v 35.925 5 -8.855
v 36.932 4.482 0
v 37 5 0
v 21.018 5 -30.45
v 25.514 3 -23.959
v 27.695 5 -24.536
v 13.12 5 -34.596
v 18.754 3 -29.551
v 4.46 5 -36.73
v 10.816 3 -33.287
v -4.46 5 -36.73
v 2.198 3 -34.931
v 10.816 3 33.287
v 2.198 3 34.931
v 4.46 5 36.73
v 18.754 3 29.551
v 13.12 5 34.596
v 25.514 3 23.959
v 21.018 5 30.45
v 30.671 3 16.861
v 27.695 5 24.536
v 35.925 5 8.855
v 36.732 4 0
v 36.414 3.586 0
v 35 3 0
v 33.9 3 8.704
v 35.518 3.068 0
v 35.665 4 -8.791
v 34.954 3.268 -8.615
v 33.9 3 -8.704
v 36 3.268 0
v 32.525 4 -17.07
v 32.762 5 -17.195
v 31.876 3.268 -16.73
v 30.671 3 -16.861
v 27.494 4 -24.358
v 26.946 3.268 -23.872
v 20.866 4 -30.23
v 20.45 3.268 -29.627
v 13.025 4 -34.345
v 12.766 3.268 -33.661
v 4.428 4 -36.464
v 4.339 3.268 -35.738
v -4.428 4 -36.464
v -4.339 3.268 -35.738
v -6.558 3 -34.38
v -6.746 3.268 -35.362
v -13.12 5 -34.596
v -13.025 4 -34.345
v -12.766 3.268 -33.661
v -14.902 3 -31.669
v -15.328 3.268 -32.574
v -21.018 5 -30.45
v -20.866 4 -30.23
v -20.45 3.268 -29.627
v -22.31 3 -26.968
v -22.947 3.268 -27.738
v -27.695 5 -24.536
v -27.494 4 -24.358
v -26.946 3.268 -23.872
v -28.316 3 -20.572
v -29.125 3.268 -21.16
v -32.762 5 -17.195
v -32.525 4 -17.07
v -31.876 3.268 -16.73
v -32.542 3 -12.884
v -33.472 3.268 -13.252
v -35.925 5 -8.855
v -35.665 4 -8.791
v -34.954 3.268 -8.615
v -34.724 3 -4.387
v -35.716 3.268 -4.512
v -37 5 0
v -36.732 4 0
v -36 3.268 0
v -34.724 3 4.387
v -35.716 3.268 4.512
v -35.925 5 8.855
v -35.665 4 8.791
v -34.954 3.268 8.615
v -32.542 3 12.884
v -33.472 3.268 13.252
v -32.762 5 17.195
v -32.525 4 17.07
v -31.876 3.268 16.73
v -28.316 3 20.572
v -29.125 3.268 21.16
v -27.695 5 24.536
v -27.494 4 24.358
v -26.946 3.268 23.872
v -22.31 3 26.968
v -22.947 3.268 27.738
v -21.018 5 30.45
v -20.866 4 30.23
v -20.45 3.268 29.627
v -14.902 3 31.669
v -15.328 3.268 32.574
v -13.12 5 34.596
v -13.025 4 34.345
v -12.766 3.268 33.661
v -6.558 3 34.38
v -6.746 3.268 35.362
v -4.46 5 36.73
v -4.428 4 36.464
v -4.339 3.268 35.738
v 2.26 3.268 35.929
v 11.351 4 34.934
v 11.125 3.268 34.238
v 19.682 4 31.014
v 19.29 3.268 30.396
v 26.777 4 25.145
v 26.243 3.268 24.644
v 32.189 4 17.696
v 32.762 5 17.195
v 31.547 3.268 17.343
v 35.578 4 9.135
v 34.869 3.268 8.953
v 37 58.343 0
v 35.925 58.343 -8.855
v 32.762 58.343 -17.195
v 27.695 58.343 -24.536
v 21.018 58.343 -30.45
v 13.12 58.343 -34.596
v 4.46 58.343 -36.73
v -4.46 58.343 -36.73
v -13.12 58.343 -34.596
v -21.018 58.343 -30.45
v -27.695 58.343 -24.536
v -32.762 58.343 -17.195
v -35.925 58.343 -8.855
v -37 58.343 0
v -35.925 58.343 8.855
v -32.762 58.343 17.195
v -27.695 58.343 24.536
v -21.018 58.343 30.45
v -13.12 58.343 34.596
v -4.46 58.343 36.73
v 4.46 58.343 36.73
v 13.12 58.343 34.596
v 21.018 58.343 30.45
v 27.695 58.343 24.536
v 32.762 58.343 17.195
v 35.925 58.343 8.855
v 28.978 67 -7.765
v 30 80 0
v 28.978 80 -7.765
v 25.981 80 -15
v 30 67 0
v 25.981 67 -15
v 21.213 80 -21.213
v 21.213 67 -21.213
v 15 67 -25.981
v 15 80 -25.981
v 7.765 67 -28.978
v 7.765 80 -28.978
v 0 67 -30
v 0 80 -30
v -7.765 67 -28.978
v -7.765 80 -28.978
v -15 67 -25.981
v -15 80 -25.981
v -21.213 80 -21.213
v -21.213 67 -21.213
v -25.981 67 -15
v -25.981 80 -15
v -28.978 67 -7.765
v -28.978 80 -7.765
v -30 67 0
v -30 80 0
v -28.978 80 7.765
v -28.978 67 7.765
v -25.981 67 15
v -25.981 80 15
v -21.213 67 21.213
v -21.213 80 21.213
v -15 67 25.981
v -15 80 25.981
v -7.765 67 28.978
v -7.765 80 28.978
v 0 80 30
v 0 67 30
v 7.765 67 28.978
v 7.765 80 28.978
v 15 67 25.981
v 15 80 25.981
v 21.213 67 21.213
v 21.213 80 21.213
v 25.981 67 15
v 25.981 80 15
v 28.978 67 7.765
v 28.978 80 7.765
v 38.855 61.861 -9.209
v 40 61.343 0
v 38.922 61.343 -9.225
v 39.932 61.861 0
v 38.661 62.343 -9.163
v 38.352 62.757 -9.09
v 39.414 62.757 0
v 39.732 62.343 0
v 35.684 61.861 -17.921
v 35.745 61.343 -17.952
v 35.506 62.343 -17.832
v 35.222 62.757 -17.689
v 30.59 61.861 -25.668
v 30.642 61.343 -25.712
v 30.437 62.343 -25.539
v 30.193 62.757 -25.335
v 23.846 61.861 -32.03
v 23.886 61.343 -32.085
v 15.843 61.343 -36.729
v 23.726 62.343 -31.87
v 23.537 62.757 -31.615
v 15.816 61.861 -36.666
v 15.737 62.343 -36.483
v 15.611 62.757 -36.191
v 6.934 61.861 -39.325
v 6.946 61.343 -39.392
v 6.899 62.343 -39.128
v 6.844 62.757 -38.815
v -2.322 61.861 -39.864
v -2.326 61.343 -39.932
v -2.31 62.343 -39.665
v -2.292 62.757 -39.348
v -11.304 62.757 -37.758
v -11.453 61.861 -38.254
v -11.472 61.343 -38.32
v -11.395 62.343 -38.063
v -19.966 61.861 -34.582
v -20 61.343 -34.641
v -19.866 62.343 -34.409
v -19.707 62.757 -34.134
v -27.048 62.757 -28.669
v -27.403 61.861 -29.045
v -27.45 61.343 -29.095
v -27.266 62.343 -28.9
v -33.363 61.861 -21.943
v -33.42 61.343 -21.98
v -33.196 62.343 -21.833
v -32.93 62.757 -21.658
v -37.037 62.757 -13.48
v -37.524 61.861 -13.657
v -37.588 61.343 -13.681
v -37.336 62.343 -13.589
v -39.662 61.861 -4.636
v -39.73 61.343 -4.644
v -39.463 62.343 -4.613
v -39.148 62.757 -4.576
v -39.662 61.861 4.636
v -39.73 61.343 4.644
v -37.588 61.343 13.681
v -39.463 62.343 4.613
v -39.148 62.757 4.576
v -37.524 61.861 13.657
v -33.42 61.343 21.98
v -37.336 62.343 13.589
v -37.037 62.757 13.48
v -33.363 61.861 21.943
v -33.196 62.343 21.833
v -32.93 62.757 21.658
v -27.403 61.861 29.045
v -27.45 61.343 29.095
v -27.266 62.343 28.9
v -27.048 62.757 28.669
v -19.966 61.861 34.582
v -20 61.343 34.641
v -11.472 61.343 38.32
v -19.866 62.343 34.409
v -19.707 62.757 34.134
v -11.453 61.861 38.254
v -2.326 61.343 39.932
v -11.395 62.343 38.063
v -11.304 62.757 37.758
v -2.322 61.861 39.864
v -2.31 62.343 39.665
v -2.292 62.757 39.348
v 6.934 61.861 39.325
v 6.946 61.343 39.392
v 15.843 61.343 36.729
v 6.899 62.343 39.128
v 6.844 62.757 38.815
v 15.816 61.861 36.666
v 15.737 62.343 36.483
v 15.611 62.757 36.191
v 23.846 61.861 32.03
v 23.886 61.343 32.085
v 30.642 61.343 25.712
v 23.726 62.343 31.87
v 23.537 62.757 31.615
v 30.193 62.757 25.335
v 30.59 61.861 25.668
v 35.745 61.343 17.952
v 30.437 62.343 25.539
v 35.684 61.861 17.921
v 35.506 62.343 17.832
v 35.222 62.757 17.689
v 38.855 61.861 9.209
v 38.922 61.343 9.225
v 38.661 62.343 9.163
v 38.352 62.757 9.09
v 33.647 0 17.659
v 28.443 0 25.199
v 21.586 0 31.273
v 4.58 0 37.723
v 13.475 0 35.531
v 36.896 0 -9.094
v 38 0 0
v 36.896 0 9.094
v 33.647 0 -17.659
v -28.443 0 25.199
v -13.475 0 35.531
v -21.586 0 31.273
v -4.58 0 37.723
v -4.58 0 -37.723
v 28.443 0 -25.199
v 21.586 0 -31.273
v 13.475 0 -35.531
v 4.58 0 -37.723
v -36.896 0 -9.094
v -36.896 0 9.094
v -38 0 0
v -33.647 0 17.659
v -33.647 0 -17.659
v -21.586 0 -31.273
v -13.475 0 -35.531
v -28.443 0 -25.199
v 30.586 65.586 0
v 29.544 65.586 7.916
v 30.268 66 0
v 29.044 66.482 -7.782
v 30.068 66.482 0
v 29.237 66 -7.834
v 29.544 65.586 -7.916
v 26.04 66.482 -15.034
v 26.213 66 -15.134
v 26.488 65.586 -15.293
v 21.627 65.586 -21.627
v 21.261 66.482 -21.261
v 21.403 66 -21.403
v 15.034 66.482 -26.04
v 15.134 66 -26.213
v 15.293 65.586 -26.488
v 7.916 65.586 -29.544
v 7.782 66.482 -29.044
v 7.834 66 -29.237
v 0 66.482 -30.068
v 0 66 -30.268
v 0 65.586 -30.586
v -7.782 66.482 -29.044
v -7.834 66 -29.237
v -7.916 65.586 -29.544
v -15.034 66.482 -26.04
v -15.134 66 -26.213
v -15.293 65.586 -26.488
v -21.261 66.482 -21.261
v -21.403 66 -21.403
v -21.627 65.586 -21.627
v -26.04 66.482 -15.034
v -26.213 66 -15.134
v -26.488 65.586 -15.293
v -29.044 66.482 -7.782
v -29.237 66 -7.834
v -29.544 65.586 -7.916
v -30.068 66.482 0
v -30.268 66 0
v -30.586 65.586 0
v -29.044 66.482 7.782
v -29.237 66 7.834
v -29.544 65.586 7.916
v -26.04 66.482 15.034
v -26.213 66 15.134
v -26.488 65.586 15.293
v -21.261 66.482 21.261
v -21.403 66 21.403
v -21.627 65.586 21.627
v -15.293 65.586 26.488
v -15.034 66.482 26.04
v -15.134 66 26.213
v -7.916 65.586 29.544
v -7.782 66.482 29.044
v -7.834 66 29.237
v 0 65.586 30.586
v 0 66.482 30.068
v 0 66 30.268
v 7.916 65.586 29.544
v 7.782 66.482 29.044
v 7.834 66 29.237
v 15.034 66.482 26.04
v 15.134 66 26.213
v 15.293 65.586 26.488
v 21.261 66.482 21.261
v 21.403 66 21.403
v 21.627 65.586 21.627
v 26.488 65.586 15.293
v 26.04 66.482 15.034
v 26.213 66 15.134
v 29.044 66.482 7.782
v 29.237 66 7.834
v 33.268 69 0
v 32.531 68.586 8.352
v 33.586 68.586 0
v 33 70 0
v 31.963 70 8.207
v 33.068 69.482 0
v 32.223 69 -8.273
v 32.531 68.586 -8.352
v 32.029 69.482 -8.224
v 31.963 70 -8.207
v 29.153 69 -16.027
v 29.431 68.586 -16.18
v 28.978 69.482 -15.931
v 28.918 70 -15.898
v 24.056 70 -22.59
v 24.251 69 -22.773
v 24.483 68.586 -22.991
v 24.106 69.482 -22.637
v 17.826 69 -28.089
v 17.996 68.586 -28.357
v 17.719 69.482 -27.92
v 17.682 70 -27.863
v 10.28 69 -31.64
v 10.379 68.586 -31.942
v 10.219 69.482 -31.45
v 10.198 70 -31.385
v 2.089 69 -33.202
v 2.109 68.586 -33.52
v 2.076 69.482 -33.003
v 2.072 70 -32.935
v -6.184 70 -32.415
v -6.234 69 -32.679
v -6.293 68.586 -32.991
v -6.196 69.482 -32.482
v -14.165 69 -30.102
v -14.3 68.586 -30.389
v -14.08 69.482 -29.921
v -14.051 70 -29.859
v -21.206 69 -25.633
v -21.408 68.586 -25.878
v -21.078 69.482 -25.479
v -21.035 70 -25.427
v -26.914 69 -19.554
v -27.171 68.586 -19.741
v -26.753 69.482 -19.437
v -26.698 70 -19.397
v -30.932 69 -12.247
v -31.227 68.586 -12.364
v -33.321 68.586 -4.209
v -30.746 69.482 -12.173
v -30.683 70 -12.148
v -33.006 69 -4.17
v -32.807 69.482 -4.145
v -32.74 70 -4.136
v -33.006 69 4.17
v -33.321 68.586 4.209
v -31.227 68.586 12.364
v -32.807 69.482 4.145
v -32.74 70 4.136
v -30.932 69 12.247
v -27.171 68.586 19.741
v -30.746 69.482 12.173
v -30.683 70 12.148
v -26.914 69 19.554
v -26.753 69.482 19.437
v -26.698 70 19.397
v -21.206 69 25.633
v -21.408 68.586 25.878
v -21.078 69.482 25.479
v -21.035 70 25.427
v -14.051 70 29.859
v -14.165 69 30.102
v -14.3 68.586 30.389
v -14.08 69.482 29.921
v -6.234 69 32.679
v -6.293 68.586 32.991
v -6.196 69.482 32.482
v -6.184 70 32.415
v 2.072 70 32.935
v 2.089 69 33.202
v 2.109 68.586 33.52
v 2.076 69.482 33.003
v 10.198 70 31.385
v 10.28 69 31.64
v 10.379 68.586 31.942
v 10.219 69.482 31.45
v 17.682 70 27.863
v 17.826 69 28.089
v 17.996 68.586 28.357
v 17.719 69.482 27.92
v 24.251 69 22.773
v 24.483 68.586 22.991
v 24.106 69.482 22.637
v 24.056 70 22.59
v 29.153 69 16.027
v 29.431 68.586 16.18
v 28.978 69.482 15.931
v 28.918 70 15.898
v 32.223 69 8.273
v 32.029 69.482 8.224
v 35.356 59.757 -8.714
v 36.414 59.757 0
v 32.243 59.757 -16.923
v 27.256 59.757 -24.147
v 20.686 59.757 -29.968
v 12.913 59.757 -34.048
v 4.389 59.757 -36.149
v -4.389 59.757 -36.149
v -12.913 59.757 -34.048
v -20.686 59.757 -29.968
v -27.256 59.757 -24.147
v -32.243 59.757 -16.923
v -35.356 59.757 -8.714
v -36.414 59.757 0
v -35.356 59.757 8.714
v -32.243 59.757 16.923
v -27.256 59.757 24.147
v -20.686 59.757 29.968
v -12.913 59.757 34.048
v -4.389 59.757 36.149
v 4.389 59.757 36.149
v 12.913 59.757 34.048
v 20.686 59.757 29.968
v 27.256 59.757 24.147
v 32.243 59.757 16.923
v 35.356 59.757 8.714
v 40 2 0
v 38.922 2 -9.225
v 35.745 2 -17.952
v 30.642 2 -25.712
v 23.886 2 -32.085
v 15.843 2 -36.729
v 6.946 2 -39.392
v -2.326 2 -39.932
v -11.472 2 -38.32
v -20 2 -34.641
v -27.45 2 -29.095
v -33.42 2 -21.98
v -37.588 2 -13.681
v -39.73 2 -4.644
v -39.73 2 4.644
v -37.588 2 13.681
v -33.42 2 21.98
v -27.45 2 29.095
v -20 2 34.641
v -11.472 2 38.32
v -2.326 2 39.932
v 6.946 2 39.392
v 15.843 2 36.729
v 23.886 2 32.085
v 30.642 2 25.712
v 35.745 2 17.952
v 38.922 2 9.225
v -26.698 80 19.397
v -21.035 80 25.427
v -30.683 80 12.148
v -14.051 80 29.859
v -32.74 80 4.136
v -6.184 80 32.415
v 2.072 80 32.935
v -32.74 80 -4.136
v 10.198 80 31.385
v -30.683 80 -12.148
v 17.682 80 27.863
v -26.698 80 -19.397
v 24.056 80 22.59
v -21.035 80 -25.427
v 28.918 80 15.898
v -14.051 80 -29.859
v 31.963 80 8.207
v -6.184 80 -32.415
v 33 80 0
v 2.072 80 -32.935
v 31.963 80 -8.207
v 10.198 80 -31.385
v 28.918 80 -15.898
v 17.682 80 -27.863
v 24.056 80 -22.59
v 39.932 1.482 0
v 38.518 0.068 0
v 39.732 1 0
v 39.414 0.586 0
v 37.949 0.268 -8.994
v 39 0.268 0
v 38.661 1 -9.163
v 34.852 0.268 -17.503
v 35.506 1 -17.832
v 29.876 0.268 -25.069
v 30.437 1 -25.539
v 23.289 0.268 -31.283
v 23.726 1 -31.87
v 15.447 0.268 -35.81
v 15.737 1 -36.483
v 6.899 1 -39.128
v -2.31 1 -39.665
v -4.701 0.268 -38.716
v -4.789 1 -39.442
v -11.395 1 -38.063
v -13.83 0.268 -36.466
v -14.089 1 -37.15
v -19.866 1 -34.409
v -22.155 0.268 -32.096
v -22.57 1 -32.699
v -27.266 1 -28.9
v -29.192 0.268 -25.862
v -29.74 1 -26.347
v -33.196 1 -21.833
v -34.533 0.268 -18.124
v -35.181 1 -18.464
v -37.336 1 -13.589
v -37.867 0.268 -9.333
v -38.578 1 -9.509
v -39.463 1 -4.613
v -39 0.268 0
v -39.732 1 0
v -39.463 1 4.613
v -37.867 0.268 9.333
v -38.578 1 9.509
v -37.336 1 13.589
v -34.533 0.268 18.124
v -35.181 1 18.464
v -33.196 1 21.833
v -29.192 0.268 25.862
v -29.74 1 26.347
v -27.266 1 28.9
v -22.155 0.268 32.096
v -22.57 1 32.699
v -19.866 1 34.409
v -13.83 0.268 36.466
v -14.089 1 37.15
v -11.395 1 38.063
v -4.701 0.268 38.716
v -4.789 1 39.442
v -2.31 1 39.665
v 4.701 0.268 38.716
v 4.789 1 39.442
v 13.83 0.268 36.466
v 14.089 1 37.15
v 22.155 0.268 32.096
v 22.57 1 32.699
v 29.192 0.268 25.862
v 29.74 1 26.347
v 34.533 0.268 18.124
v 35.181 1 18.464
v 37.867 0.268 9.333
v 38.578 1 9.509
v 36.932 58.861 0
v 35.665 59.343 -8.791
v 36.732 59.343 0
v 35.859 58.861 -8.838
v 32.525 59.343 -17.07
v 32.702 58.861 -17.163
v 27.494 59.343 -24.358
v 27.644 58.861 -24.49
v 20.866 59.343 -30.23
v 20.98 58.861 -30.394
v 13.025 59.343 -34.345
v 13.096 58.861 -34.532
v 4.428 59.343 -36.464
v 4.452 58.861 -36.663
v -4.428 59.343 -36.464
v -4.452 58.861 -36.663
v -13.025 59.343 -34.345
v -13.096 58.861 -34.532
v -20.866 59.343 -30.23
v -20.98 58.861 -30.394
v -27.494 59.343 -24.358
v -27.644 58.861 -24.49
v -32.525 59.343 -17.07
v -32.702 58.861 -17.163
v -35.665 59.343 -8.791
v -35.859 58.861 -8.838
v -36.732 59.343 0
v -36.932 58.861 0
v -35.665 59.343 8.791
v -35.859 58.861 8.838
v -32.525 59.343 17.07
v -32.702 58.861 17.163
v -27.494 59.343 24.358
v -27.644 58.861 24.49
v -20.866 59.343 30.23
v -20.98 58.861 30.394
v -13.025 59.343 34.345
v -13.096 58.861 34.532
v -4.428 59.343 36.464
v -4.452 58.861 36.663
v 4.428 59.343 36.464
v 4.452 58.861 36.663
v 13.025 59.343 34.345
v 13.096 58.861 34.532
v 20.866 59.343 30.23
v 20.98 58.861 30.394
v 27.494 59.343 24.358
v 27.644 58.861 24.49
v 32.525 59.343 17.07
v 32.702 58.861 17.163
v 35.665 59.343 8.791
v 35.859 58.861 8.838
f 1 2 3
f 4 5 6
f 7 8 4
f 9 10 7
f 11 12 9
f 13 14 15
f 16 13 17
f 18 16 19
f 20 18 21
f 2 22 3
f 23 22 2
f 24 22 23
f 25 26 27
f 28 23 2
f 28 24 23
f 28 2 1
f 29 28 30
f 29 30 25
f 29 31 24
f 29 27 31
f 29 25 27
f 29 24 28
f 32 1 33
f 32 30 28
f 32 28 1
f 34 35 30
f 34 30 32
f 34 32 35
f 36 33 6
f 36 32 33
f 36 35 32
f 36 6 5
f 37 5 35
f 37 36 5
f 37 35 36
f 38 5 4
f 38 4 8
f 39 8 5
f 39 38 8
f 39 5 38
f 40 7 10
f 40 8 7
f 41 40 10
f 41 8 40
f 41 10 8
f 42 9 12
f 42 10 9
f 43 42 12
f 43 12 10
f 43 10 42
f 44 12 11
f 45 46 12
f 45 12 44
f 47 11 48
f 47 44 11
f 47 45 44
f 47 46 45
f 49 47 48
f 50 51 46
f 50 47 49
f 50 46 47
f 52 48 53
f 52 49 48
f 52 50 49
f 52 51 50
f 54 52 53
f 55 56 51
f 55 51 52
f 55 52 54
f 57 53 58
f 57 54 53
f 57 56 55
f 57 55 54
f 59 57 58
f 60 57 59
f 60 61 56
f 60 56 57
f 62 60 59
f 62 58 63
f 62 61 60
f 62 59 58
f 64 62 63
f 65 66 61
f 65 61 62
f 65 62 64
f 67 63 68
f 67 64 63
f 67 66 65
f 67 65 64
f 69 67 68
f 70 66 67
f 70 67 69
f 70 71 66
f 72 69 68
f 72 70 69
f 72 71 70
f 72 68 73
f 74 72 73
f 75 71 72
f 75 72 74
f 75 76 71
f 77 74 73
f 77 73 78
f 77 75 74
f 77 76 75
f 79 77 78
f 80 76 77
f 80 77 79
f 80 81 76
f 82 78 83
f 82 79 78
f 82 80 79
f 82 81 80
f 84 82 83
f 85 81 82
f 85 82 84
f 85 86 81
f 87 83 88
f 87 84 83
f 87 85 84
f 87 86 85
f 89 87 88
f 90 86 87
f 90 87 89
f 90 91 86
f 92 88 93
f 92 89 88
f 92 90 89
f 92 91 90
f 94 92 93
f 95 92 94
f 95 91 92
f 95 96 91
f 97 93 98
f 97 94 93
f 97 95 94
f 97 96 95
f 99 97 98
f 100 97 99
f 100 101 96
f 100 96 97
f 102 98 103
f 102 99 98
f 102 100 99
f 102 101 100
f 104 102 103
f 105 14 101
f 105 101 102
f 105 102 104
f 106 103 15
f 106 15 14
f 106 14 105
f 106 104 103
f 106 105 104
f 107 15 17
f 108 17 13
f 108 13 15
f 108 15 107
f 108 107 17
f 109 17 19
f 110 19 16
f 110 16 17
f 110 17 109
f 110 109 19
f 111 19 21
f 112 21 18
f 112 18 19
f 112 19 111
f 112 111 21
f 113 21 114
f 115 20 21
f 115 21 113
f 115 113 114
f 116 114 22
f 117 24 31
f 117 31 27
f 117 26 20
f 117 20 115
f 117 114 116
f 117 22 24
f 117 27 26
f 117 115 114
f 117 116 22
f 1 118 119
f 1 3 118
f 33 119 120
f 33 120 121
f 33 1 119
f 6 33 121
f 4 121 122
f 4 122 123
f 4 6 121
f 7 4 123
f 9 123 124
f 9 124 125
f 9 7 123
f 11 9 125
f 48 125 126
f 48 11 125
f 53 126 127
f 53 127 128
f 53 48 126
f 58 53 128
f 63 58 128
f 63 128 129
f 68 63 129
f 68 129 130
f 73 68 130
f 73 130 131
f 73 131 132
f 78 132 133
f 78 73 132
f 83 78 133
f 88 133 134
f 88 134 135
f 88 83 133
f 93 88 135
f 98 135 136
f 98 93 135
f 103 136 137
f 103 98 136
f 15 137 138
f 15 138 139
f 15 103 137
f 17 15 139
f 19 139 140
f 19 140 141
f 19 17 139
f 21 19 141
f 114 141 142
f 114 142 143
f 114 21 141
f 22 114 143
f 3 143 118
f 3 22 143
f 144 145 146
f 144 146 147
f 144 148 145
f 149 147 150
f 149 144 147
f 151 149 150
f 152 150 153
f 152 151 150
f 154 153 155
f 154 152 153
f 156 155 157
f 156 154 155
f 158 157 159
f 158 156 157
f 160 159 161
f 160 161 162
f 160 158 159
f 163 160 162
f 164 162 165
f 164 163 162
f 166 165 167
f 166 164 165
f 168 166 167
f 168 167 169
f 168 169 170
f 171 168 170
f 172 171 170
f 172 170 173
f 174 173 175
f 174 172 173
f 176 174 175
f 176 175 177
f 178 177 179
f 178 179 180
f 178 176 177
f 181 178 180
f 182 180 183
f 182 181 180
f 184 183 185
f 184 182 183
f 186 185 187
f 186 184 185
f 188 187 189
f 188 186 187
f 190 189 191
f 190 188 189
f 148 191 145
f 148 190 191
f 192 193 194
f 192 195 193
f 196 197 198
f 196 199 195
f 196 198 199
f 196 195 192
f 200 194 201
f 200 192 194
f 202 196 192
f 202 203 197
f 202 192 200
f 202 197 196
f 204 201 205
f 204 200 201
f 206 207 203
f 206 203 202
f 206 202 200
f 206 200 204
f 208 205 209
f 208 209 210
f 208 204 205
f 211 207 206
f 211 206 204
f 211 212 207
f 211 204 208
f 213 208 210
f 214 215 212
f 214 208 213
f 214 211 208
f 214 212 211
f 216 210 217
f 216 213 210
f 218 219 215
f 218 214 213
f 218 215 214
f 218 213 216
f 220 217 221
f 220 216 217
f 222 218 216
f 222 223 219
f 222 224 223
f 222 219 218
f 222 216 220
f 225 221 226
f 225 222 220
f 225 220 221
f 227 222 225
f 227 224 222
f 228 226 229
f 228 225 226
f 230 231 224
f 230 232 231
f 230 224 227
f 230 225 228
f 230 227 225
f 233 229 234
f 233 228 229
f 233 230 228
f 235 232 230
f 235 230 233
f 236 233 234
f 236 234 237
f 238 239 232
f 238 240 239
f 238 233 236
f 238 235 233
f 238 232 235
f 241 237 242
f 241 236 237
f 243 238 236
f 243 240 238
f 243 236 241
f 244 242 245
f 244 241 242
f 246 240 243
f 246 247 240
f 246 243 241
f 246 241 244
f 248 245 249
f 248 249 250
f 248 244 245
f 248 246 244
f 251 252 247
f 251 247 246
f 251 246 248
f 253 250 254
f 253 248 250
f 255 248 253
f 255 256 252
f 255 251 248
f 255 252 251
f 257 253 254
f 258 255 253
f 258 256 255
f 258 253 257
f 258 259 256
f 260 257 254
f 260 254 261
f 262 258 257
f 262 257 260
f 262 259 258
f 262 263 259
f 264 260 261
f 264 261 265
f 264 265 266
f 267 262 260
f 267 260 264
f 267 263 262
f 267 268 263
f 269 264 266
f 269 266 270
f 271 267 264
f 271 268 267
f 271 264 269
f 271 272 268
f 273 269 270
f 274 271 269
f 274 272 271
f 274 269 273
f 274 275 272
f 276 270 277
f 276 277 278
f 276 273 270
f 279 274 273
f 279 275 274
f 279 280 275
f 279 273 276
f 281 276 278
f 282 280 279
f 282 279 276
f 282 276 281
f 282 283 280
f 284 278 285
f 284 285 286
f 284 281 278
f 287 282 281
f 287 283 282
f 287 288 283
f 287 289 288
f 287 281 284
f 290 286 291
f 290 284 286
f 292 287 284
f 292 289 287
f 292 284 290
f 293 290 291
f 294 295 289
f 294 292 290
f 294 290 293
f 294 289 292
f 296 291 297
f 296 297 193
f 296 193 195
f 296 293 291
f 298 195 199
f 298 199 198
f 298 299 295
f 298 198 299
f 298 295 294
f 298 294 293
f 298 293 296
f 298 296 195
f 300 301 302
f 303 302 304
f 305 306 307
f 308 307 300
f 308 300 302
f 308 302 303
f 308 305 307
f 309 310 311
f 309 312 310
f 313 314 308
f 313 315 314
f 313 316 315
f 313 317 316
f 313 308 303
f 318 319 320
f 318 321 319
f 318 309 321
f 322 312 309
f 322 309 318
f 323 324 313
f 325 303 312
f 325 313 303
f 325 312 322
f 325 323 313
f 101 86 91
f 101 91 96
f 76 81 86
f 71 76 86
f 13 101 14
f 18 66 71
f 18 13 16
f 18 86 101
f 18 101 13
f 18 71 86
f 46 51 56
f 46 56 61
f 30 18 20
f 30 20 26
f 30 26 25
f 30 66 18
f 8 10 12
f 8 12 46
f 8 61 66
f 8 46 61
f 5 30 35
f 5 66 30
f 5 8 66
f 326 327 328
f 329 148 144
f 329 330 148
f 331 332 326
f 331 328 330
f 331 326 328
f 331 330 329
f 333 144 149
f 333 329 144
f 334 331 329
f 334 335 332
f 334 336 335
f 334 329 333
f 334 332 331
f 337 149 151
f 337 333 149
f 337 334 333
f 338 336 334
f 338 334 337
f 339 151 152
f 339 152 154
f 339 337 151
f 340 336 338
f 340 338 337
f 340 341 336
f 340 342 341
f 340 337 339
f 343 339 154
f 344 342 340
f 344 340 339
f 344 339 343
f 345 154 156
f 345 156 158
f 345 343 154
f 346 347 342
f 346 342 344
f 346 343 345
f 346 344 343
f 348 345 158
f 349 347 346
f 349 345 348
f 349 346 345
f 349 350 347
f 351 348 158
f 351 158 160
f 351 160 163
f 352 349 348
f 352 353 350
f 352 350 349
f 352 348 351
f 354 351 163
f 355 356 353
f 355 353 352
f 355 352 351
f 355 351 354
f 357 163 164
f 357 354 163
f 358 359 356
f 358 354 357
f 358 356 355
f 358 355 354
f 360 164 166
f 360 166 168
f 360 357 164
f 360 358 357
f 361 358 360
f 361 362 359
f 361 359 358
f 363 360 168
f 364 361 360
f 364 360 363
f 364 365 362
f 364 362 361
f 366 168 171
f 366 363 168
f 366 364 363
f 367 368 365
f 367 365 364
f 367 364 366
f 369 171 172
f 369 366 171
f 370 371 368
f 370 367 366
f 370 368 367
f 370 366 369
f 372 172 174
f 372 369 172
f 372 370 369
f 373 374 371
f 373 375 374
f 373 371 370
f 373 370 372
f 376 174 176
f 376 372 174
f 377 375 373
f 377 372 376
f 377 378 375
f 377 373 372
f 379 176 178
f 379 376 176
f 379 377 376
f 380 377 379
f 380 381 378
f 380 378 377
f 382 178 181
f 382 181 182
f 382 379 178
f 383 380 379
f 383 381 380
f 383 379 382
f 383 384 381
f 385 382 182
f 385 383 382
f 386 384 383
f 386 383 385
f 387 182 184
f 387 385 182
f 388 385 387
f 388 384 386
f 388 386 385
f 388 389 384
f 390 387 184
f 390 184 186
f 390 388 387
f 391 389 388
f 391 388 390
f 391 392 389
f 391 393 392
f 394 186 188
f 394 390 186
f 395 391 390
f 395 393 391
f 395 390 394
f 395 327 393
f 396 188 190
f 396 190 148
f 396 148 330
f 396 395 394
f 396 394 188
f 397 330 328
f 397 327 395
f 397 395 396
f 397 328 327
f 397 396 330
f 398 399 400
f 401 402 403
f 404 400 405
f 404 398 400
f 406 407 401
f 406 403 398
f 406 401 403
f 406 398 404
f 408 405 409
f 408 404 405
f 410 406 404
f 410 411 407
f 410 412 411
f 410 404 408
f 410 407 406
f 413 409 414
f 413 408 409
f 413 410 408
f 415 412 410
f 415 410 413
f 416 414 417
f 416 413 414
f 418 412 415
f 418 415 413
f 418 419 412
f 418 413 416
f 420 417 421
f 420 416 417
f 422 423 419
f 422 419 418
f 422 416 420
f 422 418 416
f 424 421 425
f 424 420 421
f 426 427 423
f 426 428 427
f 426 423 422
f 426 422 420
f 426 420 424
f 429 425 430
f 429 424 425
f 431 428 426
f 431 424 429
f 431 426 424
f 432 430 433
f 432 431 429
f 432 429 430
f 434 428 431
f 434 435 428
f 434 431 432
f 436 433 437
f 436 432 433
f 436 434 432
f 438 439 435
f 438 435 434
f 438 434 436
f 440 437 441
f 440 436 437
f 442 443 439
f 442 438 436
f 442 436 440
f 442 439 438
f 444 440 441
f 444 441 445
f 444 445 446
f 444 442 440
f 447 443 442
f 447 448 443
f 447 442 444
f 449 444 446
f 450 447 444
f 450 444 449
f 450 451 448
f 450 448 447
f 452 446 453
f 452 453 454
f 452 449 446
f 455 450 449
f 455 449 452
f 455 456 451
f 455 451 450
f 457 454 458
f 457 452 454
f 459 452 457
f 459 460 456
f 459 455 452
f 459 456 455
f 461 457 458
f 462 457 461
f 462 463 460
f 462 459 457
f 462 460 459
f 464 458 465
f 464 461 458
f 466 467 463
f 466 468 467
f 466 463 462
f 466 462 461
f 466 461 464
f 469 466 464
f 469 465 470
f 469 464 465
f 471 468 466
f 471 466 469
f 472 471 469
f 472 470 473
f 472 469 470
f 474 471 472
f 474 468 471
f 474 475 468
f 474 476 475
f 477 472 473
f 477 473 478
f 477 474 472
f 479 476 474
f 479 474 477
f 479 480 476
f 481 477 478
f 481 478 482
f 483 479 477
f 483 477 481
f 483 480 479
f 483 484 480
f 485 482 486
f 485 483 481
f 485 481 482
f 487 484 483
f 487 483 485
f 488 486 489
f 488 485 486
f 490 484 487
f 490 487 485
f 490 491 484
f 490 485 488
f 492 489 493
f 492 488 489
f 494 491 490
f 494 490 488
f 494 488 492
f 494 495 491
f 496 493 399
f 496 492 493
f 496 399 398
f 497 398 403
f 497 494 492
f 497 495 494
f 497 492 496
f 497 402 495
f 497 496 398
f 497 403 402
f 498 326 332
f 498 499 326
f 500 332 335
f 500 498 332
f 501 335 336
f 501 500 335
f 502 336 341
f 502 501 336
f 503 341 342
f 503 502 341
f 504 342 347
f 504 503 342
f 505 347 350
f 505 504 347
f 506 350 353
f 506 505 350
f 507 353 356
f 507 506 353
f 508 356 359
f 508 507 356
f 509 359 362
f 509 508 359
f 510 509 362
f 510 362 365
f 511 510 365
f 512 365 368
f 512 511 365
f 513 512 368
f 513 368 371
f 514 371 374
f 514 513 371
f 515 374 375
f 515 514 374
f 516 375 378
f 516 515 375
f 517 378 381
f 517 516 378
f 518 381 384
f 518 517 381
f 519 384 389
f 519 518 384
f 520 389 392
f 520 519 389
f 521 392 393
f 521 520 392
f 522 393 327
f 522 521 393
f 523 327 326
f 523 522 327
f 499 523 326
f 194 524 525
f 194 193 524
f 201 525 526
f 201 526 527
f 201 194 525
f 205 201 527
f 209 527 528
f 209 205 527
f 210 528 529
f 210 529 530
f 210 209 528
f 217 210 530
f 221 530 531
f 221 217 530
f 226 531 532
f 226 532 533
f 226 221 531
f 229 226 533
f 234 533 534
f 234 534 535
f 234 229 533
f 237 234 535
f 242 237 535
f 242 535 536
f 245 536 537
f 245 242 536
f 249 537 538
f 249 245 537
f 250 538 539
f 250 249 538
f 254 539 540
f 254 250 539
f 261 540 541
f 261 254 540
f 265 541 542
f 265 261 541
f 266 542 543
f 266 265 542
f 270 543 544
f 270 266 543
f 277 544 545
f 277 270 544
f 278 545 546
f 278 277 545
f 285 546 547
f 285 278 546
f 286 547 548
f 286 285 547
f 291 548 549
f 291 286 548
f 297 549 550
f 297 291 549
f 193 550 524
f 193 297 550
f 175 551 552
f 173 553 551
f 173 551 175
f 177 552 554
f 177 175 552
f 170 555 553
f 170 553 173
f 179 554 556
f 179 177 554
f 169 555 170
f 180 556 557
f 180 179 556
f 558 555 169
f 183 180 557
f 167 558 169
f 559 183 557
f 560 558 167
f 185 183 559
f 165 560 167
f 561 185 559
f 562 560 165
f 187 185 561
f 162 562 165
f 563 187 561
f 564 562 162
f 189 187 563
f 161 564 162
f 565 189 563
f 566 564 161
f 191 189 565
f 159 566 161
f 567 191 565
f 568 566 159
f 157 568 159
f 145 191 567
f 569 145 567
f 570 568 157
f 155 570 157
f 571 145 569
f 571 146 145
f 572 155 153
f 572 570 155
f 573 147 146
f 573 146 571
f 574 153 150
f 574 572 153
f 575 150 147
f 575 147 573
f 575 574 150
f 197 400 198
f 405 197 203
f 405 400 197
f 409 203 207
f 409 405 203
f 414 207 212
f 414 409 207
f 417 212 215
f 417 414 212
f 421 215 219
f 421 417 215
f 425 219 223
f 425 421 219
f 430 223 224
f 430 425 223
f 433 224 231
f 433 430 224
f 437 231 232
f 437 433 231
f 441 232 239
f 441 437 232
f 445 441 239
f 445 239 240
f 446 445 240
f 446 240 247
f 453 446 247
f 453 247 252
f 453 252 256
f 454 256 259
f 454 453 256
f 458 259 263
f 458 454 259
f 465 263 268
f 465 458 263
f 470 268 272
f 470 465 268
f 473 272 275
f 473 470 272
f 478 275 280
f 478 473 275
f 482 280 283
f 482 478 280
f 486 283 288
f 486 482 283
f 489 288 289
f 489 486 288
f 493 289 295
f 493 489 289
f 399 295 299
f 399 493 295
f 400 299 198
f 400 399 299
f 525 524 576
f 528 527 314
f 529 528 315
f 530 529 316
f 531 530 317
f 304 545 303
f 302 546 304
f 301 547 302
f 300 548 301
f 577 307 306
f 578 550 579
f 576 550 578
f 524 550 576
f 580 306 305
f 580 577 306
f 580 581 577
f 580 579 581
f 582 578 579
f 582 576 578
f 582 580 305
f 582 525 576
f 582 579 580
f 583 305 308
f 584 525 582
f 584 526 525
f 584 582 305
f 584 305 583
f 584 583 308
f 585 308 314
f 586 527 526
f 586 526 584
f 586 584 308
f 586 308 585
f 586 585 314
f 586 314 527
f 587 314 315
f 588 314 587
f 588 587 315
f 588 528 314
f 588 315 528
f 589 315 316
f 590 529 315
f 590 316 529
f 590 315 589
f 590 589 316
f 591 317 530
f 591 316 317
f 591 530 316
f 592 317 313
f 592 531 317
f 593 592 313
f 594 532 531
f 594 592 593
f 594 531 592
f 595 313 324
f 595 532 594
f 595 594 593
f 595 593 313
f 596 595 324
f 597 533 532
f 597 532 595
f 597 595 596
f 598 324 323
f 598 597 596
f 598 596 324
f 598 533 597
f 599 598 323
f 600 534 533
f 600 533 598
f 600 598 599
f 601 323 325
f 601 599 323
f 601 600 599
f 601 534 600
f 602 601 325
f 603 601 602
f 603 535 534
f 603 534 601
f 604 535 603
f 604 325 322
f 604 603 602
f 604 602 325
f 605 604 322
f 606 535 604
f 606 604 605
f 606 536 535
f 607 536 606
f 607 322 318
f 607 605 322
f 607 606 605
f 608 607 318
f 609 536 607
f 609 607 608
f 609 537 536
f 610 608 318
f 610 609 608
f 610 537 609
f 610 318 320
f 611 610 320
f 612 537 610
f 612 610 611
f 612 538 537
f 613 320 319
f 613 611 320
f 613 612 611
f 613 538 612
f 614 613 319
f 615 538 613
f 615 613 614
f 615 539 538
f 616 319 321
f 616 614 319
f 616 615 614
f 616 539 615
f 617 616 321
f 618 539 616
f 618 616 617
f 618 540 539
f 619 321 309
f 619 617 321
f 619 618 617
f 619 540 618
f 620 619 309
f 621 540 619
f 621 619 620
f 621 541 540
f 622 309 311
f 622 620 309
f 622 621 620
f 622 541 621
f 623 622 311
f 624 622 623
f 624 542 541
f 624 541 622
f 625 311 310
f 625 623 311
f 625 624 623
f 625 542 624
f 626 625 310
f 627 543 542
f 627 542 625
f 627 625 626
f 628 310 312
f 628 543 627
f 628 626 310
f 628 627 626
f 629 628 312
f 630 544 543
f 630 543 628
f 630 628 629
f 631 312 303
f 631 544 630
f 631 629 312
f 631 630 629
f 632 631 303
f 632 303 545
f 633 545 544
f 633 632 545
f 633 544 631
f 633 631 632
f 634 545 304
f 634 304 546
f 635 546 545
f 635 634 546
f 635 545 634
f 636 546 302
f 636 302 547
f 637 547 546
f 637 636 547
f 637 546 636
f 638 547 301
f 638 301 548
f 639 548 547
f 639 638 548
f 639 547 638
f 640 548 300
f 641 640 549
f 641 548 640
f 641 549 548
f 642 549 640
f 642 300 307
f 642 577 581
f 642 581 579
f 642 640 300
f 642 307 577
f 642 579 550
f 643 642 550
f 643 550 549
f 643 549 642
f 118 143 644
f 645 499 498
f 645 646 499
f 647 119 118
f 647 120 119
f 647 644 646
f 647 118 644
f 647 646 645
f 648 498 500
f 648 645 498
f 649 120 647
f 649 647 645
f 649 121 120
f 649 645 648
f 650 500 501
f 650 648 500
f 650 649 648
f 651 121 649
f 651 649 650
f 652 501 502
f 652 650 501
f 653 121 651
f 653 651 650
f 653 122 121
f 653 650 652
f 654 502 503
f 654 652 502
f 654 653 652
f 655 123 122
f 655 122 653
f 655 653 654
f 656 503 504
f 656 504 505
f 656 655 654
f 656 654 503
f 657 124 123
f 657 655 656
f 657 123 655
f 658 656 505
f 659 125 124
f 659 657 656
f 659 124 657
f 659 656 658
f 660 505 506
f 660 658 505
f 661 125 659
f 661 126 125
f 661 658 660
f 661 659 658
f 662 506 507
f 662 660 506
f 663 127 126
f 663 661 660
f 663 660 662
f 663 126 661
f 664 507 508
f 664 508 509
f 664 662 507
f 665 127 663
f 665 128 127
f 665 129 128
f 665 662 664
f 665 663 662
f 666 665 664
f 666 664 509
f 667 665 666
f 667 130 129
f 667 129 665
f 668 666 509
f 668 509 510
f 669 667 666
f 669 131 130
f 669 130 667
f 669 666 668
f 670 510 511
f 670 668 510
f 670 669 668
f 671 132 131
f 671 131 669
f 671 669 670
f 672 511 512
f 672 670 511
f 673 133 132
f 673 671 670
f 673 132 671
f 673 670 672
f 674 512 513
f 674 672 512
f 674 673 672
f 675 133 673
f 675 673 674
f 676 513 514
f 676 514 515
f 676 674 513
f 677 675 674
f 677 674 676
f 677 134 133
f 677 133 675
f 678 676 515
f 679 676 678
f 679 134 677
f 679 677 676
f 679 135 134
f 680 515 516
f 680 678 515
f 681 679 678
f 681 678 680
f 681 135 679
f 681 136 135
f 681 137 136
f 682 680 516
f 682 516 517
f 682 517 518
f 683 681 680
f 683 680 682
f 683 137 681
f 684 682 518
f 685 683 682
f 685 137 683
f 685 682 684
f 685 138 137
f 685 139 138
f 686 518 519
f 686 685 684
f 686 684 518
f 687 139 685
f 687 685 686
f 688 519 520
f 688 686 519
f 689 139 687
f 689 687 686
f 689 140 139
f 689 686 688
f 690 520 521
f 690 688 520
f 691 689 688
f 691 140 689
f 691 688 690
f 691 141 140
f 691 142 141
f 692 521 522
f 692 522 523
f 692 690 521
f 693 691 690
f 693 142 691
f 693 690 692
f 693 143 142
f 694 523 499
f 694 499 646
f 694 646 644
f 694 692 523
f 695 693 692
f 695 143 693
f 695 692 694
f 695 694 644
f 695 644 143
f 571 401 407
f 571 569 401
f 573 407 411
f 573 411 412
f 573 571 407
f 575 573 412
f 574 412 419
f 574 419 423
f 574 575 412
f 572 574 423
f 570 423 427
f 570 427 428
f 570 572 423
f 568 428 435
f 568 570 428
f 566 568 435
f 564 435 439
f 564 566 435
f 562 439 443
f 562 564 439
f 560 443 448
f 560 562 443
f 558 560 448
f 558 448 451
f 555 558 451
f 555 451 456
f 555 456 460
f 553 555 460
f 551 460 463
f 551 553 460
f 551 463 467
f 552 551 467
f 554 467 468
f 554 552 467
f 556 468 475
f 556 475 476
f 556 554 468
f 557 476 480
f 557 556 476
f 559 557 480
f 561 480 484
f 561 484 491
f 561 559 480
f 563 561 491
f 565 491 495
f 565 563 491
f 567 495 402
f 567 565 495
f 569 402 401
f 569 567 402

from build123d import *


with BuildPart() as part:
    # Esquisse1 → Révolution1 (revolve)
    with BuildSketch(Plane.XY):
        with BuildLine():
            Line((0, 0), (38, 0))
            ThreePointArc((38, 0), (39.414213562, 0.585786438), (40, 2))
            Line((40, 2), (40, 61.343145751))
            ThreePointArc((40, 61.343145751), (39.847759065, 62.108512615), (39.414213562, 62.757359313))
            Line((39.414213562, 62.757359313), (33.585786438, 68.585786438))
            ThreePointArc((33.585786438, 68.585786438), (33.152240935, 69.234633135), (33, 70))
            Line((33, 70), (33, 80))
            Line((33, 80), (30, 80))
            Line((30, 80), (30, 67))
            ThreePointArc((30, 67), (30.152240935, 66.234633135), (30.585786438, 65.585786438))
            Line((30.585786438, 65.585786438), (36.414213562, 59.757359313))
            ThreePointArc((36.414213562, 59.757359313), (36.847759065, 59.108512615), (37, 58.343145751))
            Line((37, 58.343145751), (37, 5))
            ThreePointArc((37, 5), (36.414213562, 3.585786438), (35, 3))
            Line((35, 3), (0, 3))
            Line((0, 3), (0, 0))
        make_face()
    revolve(axis=Axis((0, 0, 0), (0, 1, 0)))


solid = part.part
